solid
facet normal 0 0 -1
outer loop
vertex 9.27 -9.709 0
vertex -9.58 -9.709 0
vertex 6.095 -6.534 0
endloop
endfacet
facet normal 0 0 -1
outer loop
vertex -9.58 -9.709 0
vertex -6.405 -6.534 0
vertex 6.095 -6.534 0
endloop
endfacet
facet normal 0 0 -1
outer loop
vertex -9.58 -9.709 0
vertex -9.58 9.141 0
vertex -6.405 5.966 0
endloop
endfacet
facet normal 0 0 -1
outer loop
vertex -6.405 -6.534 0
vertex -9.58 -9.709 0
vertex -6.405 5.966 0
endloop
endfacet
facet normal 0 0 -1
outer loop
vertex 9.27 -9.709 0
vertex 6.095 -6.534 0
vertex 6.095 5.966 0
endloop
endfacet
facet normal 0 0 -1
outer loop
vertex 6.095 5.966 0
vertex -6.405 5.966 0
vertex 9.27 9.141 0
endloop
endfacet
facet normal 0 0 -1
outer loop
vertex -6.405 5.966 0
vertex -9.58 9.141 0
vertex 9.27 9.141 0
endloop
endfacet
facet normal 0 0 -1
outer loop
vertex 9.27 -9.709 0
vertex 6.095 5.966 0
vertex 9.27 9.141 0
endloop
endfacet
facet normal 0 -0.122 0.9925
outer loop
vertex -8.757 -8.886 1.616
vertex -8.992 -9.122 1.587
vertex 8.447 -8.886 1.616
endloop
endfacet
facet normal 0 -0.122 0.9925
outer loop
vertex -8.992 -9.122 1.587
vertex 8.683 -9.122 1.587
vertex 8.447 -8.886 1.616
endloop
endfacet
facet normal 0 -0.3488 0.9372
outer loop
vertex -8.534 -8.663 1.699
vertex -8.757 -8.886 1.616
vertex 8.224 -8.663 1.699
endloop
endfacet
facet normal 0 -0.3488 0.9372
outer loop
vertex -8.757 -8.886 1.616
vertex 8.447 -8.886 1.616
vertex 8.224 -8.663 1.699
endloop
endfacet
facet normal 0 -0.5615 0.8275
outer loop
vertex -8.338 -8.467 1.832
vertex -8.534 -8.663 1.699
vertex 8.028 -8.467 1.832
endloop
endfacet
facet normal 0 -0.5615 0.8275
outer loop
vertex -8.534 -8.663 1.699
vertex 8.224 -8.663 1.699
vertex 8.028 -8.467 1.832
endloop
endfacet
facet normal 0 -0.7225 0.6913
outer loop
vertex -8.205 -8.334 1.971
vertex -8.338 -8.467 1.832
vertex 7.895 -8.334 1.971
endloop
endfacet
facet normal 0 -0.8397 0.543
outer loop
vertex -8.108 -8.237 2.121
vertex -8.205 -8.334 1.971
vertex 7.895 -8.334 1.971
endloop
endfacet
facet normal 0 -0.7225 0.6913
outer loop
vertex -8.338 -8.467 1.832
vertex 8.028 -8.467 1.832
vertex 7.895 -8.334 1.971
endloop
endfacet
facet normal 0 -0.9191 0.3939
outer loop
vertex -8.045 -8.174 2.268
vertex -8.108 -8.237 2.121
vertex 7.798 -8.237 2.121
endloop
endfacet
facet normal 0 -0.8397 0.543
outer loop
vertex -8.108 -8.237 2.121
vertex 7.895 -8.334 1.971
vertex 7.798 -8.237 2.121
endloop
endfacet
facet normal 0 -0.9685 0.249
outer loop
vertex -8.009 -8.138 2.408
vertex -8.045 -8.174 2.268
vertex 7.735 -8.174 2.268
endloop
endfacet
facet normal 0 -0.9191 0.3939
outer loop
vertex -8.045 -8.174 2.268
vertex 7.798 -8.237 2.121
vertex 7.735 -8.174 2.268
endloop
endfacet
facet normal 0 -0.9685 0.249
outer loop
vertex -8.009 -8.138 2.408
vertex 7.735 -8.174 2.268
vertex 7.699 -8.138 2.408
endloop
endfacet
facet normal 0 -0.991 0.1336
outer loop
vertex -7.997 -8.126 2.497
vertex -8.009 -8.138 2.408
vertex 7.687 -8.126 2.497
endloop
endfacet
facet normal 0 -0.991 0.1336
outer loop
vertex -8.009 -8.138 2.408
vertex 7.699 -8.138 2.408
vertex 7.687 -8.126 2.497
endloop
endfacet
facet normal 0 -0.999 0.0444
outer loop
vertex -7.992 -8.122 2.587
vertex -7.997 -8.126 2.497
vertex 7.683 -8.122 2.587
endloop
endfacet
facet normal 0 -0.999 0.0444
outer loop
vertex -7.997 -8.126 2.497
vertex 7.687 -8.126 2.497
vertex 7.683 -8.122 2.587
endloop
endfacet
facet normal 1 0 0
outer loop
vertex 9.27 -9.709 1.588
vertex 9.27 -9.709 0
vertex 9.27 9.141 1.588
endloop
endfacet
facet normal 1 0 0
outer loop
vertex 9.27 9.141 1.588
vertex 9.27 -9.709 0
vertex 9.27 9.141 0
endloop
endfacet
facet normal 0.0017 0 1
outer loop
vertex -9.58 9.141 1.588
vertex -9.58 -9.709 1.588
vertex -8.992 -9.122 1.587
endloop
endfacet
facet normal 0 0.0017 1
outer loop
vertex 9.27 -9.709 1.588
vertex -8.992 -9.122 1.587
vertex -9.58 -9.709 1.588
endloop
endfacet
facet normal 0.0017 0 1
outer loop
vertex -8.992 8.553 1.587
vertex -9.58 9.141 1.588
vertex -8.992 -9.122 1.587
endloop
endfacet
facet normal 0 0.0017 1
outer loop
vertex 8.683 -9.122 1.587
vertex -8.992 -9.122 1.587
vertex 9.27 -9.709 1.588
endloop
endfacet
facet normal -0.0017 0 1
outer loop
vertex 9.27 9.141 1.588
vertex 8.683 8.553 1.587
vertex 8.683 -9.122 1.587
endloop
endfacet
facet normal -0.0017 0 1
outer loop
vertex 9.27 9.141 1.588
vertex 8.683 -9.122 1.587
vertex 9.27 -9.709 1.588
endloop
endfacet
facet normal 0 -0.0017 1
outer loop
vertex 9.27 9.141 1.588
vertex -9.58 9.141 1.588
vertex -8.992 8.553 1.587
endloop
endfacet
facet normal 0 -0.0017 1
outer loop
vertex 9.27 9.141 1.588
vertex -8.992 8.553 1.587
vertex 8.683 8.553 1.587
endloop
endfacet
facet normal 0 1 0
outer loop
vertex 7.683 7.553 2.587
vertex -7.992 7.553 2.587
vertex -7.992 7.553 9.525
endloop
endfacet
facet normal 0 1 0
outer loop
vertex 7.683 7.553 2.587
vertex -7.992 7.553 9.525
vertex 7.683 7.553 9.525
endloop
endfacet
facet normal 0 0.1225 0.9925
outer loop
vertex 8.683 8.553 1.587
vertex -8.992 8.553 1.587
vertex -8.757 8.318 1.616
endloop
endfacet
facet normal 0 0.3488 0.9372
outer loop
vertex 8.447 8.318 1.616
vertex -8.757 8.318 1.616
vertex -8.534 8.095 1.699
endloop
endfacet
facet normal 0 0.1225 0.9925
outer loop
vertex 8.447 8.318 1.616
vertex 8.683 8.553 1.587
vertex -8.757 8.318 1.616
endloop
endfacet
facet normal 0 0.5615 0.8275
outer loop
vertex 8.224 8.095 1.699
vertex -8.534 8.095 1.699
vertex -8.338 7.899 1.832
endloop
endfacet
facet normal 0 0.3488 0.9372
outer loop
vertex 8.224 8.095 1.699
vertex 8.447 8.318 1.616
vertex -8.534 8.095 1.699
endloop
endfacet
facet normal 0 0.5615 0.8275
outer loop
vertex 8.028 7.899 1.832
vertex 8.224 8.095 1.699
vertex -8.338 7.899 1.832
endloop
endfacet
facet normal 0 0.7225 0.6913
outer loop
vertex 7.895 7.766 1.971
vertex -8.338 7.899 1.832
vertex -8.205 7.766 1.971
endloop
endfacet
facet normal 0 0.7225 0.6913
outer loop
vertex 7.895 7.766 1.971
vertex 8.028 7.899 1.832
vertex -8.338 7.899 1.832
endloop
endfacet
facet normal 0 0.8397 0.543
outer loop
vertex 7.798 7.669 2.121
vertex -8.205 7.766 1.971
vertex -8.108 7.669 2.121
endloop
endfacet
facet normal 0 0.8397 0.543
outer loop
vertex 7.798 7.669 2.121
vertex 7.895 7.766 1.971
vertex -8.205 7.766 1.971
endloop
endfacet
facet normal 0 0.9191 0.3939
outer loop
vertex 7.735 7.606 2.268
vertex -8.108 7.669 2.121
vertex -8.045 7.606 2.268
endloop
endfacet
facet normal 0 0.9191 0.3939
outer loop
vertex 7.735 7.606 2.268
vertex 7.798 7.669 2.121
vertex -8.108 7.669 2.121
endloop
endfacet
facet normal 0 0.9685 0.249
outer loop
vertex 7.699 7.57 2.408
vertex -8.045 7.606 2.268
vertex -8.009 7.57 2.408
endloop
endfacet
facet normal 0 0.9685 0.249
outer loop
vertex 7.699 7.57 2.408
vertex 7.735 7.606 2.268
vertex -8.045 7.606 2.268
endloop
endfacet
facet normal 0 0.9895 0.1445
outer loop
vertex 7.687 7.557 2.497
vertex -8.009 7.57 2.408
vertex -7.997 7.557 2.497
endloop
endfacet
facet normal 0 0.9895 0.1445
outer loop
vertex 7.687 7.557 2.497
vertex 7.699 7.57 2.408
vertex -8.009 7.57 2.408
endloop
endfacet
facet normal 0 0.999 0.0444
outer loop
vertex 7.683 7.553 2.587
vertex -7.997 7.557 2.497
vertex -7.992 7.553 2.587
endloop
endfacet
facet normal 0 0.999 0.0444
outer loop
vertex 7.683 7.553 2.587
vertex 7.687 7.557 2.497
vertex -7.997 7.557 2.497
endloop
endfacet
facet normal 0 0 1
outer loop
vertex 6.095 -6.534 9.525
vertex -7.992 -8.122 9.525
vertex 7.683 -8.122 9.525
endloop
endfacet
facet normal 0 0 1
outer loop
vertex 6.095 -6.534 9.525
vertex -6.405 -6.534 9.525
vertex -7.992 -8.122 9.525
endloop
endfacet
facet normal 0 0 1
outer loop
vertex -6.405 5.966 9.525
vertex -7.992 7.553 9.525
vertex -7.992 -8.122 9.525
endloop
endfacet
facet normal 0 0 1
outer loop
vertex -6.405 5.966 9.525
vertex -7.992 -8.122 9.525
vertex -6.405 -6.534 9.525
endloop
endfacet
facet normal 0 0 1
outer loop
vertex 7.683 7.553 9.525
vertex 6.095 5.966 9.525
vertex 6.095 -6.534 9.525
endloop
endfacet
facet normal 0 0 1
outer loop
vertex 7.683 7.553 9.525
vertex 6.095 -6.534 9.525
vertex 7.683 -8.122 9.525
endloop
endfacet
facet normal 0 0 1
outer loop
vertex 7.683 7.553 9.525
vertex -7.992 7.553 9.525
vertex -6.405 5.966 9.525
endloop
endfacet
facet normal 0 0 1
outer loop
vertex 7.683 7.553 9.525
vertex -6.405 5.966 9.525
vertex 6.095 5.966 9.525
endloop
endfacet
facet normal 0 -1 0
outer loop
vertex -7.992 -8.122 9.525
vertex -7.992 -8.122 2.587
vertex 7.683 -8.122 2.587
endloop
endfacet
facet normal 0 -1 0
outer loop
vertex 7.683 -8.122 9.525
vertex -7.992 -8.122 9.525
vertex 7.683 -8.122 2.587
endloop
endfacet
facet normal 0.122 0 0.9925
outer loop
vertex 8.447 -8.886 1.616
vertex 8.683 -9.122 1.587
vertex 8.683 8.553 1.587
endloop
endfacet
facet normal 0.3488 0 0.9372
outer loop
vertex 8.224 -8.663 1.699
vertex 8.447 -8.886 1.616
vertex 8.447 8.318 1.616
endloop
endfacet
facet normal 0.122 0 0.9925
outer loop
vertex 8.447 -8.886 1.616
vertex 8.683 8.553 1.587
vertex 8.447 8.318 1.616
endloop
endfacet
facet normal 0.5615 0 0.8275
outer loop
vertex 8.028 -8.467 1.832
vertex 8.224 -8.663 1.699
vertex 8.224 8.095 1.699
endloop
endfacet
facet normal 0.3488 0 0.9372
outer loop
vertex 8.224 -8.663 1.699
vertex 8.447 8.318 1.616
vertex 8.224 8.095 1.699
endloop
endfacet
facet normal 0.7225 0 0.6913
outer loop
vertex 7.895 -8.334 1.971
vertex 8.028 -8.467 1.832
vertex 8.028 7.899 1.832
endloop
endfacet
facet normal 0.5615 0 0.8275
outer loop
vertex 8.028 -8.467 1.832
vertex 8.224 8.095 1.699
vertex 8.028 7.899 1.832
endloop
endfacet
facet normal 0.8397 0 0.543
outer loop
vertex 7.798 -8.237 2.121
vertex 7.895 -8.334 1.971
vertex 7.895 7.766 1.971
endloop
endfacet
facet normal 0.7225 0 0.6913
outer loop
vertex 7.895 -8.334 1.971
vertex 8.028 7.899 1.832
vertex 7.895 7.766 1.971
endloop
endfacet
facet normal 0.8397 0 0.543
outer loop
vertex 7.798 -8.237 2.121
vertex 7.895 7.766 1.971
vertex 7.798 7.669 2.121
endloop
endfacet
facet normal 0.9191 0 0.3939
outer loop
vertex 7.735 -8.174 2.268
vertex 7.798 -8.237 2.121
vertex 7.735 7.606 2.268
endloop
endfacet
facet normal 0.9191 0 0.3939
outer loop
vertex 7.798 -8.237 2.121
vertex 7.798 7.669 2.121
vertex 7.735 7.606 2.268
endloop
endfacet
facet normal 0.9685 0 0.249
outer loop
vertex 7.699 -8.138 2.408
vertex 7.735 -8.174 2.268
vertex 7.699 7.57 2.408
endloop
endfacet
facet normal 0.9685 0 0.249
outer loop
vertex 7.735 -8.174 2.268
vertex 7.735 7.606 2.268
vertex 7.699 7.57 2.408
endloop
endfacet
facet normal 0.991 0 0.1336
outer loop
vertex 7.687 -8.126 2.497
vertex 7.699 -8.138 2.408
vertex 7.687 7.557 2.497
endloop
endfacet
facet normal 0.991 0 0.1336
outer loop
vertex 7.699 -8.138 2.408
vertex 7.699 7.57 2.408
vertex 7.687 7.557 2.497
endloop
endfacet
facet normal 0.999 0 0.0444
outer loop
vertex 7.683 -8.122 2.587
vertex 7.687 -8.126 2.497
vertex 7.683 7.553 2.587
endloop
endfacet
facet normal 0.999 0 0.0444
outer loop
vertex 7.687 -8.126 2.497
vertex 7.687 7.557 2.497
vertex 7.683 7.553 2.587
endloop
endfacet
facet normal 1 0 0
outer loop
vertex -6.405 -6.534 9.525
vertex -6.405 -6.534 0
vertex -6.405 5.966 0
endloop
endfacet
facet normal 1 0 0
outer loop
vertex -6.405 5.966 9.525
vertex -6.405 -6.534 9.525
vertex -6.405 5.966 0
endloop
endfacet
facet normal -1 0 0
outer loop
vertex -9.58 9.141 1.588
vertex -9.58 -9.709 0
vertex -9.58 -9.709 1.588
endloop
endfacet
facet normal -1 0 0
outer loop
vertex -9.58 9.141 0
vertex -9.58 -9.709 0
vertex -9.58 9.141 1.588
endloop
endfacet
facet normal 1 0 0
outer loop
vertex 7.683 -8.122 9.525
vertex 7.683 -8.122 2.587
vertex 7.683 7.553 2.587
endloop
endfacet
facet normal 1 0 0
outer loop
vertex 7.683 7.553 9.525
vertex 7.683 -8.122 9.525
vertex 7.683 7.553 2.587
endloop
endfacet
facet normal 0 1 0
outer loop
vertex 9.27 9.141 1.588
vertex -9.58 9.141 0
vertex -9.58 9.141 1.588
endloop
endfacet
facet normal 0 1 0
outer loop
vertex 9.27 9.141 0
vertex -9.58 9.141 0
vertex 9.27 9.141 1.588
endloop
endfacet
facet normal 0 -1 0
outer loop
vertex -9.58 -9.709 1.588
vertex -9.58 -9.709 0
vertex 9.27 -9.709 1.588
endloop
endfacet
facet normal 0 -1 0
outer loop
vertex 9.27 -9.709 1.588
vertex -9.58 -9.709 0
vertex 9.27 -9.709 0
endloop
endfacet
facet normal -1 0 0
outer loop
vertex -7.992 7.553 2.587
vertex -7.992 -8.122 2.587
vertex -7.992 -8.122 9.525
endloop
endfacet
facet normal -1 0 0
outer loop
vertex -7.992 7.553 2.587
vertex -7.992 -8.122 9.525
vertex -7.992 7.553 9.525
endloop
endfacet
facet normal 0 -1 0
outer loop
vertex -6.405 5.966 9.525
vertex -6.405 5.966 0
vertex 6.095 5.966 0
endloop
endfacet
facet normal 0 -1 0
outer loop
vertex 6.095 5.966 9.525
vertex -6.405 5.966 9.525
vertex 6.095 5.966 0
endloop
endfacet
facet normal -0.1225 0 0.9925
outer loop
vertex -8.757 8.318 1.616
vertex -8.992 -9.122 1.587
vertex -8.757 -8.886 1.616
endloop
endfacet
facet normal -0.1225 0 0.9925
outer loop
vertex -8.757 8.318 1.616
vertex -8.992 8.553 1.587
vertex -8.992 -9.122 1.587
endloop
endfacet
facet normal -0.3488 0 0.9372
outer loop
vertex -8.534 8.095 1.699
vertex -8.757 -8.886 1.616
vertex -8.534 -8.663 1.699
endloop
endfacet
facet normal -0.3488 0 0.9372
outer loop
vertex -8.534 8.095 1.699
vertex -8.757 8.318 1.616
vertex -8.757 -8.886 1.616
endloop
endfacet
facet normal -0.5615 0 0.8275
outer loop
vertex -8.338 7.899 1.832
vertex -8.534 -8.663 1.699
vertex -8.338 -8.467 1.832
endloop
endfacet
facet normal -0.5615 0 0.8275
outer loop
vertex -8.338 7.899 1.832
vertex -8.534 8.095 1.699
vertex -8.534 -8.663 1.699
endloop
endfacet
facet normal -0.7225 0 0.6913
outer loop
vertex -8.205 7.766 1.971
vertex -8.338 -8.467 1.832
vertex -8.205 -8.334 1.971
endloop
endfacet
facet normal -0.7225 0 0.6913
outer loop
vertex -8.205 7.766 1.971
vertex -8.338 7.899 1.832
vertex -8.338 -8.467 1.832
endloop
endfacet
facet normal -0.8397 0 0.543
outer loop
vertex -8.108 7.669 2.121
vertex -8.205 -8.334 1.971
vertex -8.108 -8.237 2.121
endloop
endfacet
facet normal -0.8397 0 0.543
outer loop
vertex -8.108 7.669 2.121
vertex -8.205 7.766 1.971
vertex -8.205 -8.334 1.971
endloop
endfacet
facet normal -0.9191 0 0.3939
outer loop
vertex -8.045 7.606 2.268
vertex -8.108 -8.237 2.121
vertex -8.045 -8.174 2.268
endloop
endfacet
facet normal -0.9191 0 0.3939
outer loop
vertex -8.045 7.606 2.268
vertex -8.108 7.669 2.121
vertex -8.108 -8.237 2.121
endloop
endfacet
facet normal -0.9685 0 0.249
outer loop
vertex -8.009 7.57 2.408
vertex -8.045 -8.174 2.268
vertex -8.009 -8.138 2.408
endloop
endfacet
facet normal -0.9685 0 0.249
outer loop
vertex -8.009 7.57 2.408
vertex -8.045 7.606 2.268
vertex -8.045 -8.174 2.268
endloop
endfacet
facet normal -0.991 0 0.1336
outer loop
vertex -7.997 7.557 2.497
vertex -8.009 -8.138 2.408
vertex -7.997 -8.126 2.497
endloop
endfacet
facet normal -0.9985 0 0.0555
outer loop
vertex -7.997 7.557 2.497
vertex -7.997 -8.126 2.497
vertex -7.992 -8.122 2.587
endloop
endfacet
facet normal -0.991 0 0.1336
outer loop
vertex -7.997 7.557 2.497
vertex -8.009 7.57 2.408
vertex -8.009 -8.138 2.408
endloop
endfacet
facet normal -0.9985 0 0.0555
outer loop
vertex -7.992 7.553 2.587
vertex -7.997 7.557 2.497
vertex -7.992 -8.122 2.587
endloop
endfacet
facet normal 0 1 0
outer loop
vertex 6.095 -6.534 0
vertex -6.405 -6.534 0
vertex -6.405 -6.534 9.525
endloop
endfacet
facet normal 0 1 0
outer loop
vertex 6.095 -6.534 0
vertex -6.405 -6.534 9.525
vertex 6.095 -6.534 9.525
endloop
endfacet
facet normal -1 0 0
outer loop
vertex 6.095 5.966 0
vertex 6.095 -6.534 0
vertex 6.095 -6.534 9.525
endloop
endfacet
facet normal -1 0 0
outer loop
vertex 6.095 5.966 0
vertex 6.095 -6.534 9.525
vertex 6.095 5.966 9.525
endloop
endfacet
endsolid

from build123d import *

# Parameters (mm, degrees)
SKETCH1_W           = 15.675
SKETCH1_H           = 15.675
SKETCH1_W_2         = 12.5
SKETCH1_H_2         = 12.5
BOSS_EXTRUDE2_DEPTH = 9.525
SKETCH1_7_W         = 18.85
SKETCH1_7_H         = 18.85
BOSS_EXTRUDE3_DEPTH = 1.5875
SKETCH1_8_W         = 12.5
SKETCH1_8_H         = 12.5
CUT_EXTRUDE3_DEPTH  = 17.636336121
FILLET4_R           = 1


with BuildPart() as part:
    # Sketch1 → Boss-Extrude2 (new body)
    with BuildSketch(Plane.XY):
        with Locations((-0.154958678, -0.284090909)):
            Rectangle(SKETCH1_W, SKETCH1_H)
        with Locations((-0.154958678, -0.284090909)):
            Rectangle(SKETCH1_W_2, SKETCH1_H_2, mode=Mode.SUBTRACT)
    extrude(amount=BOSS_EXTRUDE2_DEPTH)

    # Sketch1<7> → Boss-Extrude3 (add)
    with BuildSketch(Plane.XY):
        with Locations((-0.154958678, -0.284090909)):
            Rectangle(SKETCH1_7_W, SKETCH1_7_H)
    extrude(amount=BOSS_EXTRUDE3_DEPTH)

    # Sketch1<8> → Cut-Extrude3 (cut, through all)
    with BuildSketch(Plane.XY):
        with Locations((-0.154958678, -0.284090909)):
            Rectangle(SKETCH1_8_W, SKETCH1_8_H)
    extrude(amount=CUT_EXTRUDE3_DEPTH, mode=Mode.SUBTRACT)

    # Fillet4
    fillet4_edges = [part.edges().sort_by_distance(p)[0] for p in [
        (7.682541322, -0.284090909, 1.5875),
        (-0.154958678, 7.553409091, 1.5875),
        (-0.154958678, -8.121590909, 1.5875),
        (-7.992458678, -0.284090909, 1.5875),
    ]]
    fillet(fillet4_edges, radius=FILLET4_R)


solid = part.part
